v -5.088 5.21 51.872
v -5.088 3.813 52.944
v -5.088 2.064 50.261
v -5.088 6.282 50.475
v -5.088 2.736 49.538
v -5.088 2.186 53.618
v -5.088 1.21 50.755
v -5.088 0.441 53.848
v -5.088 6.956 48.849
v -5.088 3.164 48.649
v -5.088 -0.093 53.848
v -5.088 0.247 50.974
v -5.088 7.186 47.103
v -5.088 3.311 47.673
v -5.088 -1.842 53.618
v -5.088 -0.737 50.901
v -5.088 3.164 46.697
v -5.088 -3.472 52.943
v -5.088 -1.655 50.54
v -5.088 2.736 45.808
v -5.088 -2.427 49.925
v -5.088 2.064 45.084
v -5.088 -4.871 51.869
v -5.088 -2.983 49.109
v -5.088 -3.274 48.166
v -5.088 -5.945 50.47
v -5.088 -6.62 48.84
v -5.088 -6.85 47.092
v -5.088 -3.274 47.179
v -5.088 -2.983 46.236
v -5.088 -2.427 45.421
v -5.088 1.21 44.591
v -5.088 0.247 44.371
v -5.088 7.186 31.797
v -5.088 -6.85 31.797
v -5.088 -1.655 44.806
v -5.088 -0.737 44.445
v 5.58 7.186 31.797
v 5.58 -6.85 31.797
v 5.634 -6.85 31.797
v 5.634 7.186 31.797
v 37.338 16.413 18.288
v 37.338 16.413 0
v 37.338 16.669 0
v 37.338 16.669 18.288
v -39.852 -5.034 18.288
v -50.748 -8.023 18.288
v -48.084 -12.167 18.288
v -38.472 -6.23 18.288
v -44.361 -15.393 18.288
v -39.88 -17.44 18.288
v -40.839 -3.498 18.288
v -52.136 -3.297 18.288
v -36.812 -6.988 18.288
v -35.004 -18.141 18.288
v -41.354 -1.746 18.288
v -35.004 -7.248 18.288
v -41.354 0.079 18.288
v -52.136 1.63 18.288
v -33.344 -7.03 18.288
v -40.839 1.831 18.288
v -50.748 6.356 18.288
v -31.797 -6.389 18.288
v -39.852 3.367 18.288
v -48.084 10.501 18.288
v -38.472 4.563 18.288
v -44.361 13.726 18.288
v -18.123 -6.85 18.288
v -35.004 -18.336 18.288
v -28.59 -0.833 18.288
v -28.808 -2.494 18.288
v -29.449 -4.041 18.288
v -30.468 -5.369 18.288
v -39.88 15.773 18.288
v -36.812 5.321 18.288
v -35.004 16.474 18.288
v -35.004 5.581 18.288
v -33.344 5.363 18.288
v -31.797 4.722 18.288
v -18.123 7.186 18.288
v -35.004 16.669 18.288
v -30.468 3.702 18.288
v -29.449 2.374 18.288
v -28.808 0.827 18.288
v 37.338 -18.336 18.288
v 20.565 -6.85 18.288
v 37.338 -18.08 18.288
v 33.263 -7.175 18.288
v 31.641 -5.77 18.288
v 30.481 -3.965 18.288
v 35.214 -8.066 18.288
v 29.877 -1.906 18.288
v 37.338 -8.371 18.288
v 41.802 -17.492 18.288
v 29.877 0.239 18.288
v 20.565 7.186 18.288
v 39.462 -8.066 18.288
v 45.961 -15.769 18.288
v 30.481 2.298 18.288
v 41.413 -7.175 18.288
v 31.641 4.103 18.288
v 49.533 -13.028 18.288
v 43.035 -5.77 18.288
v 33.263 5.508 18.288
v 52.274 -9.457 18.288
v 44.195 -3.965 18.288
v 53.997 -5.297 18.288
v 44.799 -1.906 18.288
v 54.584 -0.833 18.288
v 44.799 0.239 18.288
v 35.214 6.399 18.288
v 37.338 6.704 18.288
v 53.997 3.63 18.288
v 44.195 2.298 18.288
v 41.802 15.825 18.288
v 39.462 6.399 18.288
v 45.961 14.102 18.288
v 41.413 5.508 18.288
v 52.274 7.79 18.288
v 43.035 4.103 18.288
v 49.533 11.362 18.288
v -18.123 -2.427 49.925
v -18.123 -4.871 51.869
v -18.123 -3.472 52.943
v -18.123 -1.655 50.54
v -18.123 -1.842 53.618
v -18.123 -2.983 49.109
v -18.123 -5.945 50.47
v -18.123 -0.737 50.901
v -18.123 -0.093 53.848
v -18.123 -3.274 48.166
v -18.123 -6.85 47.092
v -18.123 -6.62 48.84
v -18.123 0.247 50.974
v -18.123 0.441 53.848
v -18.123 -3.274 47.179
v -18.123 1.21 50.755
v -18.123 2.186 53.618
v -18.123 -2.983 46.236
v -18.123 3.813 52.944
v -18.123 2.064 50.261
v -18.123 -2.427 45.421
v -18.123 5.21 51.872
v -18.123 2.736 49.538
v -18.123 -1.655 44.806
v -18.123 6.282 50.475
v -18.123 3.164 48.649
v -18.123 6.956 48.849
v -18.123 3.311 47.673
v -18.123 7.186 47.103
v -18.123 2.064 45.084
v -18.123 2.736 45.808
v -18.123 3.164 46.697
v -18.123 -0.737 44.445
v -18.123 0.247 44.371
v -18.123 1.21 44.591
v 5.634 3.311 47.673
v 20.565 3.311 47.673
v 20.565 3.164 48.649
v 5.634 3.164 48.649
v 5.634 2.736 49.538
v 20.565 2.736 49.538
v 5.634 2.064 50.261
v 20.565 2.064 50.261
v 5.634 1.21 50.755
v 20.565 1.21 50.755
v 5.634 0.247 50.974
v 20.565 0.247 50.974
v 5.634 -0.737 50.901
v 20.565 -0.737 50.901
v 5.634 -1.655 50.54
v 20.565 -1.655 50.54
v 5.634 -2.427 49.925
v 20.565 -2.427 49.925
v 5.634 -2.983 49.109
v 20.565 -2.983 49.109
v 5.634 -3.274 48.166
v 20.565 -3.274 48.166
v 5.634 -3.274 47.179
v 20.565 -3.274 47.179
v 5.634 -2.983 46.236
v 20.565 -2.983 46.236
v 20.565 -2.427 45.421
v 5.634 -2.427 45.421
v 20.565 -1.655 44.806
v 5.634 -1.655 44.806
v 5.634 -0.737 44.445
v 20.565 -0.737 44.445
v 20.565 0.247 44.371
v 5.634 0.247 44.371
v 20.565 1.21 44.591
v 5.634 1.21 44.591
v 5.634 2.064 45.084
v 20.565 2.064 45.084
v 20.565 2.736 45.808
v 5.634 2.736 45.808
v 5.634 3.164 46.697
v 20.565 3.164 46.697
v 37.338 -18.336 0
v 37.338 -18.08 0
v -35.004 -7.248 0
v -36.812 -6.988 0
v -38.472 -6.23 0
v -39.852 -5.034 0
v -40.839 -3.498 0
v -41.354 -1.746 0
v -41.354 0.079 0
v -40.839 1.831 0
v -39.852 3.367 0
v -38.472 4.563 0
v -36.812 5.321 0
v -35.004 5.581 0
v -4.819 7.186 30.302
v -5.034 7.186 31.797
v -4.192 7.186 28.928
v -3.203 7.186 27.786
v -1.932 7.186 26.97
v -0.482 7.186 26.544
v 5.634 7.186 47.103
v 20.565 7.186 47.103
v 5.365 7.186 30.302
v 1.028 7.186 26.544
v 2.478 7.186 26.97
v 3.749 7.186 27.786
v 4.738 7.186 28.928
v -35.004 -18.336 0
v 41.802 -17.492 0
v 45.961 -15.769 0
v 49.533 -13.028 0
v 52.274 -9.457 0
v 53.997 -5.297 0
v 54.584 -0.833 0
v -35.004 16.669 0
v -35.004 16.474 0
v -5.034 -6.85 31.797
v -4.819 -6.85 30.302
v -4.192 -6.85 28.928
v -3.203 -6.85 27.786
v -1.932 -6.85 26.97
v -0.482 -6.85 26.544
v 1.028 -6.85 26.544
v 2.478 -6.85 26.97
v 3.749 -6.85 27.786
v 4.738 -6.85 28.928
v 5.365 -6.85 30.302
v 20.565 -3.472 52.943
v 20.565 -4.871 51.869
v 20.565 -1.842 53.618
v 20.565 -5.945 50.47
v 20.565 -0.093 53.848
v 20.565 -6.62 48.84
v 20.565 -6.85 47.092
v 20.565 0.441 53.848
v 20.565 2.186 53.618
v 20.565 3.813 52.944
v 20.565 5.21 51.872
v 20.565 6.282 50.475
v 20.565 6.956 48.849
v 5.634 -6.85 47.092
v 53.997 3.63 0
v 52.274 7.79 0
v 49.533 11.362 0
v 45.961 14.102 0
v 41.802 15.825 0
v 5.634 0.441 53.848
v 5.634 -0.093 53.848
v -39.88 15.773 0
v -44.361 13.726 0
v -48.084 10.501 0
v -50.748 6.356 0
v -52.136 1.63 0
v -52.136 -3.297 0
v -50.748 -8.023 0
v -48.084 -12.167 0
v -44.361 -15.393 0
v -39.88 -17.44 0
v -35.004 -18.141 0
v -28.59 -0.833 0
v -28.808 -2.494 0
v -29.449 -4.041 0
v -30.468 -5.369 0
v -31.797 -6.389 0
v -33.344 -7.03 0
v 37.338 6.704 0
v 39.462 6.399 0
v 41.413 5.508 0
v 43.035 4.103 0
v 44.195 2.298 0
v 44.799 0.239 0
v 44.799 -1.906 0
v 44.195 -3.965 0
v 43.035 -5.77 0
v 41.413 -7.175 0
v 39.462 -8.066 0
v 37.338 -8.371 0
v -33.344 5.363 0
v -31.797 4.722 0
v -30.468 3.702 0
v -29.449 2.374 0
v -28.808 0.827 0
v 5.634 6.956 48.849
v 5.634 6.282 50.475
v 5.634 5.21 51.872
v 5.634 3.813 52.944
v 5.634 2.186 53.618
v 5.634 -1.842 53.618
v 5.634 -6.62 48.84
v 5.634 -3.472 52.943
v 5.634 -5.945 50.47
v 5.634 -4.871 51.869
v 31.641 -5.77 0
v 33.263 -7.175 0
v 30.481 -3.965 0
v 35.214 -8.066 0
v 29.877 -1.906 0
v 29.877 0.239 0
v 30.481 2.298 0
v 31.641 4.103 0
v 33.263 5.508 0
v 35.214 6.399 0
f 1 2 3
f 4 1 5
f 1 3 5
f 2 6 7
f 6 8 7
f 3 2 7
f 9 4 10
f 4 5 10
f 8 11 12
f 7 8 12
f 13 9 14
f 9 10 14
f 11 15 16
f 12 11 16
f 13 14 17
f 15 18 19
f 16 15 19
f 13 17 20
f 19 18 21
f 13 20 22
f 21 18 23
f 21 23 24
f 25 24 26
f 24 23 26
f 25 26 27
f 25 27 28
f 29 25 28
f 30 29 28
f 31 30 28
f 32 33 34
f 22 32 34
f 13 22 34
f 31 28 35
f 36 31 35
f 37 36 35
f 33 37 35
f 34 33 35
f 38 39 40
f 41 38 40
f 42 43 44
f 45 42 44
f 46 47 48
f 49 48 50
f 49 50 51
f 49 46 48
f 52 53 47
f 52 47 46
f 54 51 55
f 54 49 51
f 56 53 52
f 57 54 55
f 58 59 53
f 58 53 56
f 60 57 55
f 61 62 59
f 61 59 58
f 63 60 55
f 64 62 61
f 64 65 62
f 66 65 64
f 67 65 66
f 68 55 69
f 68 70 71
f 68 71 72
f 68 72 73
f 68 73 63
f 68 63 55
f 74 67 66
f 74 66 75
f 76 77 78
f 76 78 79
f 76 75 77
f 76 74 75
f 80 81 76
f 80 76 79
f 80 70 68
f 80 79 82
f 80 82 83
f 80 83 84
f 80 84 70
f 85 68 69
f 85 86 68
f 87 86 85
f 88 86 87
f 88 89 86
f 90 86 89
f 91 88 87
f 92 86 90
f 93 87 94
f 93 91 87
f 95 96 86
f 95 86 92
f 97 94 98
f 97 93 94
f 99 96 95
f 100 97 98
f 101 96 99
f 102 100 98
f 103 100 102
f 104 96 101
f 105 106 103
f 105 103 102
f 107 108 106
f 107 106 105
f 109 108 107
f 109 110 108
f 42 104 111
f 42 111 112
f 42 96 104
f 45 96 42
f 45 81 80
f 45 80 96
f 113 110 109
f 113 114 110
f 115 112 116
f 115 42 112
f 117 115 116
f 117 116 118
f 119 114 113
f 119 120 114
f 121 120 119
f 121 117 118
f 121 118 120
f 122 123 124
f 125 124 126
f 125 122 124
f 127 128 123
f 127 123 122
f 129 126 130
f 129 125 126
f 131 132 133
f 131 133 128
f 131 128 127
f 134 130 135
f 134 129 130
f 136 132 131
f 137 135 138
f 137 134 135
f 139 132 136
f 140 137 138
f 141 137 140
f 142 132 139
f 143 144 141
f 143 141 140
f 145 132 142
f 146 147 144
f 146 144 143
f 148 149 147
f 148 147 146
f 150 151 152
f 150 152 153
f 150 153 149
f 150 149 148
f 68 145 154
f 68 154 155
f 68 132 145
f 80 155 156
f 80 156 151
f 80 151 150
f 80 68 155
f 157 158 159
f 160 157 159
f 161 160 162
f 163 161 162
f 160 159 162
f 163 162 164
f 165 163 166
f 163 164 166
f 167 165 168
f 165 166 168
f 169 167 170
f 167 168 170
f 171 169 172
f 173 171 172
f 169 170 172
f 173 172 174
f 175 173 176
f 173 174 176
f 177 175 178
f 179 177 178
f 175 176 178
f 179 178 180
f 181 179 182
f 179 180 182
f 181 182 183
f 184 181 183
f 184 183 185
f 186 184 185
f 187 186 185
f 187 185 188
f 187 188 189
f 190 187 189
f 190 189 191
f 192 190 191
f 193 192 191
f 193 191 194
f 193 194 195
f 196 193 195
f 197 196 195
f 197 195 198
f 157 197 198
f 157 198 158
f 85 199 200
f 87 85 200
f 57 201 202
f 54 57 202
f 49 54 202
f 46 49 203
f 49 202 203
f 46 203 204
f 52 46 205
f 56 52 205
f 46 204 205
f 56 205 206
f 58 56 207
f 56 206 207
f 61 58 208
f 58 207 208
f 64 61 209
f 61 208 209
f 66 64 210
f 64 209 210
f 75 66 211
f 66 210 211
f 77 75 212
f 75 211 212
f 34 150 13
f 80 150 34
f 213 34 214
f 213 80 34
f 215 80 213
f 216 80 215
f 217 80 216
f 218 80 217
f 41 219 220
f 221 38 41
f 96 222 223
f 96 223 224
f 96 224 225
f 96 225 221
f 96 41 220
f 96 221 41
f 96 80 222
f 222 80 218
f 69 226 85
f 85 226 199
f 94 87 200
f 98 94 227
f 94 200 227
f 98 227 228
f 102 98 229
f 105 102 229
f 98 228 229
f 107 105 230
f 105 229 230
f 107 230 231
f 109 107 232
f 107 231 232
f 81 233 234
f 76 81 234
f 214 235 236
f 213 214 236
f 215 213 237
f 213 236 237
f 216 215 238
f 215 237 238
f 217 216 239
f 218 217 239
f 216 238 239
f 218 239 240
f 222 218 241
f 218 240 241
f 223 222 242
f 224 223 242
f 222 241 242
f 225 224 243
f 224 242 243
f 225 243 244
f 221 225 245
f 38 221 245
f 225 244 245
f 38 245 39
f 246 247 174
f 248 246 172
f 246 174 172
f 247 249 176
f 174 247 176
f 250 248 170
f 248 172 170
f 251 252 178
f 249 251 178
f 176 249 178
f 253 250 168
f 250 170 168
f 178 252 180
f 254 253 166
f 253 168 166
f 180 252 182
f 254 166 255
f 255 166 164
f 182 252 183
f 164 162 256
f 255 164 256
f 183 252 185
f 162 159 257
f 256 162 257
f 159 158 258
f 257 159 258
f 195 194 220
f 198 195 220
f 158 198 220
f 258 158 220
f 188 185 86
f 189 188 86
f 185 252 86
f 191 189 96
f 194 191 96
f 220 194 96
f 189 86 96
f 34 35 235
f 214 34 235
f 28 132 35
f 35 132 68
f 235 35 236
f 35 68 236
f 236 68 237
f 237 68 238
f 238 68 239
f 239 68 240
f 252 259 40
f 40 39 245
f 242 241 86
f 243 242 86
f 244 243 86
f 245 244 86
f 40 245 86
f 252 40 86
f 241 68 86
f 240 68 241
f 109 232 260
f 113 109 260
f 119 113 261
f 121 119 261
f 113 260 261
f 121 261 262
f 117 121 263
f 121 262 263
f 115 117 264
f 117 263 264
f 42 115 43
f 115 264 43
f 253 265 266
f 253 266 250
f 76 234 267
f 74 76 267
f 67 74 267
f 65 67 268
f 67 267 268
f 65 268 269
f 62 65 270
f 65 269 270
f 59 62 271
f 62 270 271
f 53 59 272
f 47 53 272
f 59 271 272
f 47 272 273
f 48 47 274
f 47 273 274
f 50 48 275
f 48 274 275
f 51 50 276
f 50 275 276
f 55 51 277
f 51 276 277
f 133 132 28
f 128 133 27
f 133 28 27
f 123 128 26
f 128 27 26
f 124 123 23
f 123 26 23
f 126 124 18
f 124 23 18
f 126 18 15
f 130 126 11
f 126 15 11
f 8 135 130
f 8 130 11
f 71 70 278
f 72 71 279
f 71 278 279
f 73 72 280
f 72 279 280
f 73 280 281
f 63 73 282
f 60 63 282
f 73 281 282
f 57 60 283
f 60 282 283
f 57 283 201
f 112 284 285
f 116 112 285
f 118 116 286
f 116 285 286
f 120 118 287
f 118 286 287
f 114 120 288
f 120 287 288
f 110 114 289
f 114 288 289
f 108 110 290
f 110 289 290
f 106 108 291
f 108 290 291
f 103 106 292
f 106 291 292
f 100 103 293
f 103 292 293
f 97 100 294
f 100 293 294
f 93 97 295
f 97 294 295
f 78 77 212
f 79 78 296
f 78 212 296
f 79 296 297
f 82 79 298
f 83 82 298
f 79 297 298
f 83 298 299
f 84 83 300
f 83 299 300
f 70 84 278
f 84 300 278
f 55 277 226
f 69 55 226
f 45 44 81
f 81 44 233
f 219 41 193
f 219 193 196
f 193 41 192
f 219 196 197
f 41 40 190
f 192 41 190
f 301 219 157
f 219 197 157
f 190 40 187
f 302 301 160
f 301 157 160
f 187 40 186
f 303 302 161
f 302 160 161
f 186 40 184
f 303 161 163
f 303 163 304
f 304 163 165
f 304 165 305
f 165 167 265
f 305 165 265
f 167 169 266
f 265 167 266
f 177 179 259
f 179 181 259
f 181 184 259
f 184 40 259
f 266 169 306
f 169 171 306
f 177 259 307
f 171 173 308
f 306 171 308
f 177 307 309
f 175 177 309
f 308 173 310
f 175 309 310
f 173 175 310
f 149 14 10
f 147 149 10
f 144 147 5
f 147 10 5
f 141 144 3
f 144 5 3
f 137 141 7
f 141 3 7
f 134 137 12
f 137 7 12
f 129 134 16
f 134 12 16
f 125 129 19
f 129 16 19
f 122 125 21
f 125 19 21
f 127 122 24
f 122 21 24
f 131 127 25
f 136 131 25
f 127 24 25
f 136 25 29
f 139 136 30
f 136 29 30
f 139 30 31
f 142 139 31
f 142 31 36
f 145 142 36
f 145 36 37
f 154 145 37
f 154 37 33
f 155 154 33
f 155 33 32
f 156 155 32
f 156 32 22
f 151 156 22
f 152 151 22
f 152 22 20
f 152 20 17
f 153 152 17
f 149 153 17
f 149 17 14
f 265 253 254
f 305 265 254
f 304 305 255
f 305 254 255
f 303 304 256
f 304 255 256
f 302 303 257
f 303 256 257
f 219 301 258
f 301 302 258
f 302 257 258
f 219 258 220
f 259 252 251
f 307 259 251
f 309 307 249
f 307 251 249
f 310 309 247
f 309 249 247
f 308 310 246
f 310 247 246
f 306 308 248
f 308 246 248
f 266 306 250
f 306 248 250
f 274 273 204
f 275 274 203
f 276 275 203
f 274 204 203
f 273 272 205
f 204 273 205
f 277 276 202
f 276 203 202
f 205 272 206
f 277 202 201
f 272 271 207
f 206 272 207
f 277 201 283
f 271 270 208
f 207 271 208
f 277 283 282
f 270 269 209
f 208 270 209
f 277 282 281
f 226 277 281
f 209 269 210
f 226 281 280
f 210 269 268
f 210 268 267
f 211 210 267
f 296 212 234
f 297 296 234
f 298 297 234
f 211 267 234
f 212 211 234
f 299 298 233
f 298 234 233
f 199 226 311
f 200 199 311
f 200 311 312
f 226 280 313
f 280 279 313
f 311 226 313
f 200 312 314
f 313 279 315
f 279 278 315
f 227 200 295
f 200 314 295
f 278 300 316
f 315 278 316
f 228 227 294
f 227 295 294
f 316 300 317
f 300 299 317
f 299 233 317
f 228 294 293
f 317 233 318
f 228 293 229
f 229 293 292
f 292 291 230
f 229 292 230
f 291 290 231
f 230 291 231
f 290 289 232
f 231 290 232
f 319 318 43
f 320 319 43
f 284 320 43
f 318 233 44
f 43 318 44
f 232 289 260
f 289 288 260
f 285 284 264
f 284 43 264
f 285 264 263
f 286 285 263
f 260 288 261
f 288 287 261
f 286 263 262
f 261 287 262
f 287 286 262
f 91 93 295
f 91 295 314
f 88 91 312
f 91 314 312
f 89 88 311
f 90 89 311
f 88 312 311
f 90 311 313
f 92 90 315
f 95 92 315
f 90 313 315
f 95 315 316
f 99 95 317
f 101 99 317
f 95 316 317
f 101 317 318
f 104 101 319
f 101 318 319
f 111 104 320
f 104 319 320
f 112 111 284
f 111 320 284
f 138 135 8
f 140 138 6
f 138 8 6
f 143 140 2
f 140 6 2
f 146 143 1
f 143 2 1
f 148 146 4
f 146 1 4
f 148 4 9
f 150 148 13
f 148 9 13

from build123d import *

# Parameters (mm, degrees)
F1_DEPTH  = 18.288
F3_W      = 38.6883560568
F3_H      = 14.0357739292
F4_DEPTH  = 35.56
F5_R      = 6.7564
F6_R      = 6.7453126933
F9_DEPTH  = 51.562
F11_R     = 3.3108000024
F12_DEPTH = 139.954


with BuildPart() as f1:
    # F0 (on Top) → F1 (new body)
    with BuildSketch(Plane.XY):
        with BuildLine():
            Line((37.3380035162, 16.6687499732), (-35.0043773651, 16.6687499732))
            Line((-35.0043773651, 16.6687499732), (-35.0043773651, 16.4739897927))
            ThreePointArc((-35.0043773651, 16.4739897927), (-22.7661779649, 11.4047616221), (-17.6969497944, -0.8334377781))
            ThreePointArc((-17.6969497944, -0.8334377781), (-22.7661779649, -13.0716371782), (-35.0043773651, -18.1408653488))
            Line((-35.0043773651, -18.1408653488), (-35.0043773651, -18.3356255293))
            Line((-35.0043773651, -18.3356255293), (37.3380035162, -18.3356255293))
            Line((37.3380035162, -18.3356255293), (37.3380035162, -18.0797577525))
            ThreePointArc((37.3380035162, -18.0797577525), (20.0916835417, -0.8334377781), (37.3380035162, 16.4128821964))
            Line((37.3380035162, 16.4128821964), (37.3380035162, 16.6687499732))
        make_face()
        with BuildLine():
            ThreePointArc((54.5843234907, -0.8334377781), (49.5329933207, 11.3615520264), (37.3380035162, 16.4128821964))
            Line((37.3380035162, 16.4128821964), (37.3380035162, 6.7044516866))
            ThreePointArc((37.3380035162, 6.7044516866), (42.6680962725, 4.4966549783), (44.8758929809, -0.8334377781))
            ThreePointArc((44.8758929809, -0.8334377781), (42.6680962725, -6.1635305344), (37.3380035162, -8.3713272428))
            Line((37.3380035162, -8.3713272428), (37.3380035162, -18.0797577525))
            ThreePointArc((37.3380035162, -18.0797577525), (49.5329933207, -13.0284275825), (54.5843234907, -0.8334377781))
        make_face()
        with BuildLine():
            Line((-35.0043773651, 5.5813243756), (-35.0043773651, 16.4739897927))
            ThreePointArc((-35.0043773651, 16.4739897927), (-52.3118049358, -0.8334377781), (-35.0043773651, -18.1408653488))
            Line((-35.0043773651, -18.1408653488), (-35.0043773651, -7.2481999317))
            ThreePointArc((-35.0043773651, -7.2481999317), (-41.4191395188, -0.8334377781), (-35.0043773651, 5.5813243756))
        make_face()
        with BuildLine():
            ThreePointArc((-17.6969497944, -0.8334377781), (-22.7661779649, 11.4047616221), (-35.0043773651, 16.4739897927))
            Line((-35.0043773651, 16.4739897927), (-35.0043773651, 5.5813243756))
            ThreePointArc((-35.0043773651, 5.5813243756), (-30.4684555466, 3.7024840405), (-28.5896152114, -0.8334377781))
            ThreePointArc((-28.5896152114, -0.8334377781), (-30.4684555466, -5.3693595966), (-35.0043773651, -7.2481999317))
            Line((-35.0043773651, -7.2481999317), (-35.0043773651, -18.1408653488))
            ThreePointArc((-35.0043773651, -18.1408653488), (-22.7661779649, -13.0716371782), (-17.6969497944, -0.8334377781))
        make_face()
        with BuildLine():
            Line((37.3380035162, 6.7044516866), (37.3380035162, 16.4128821964))
            ThreePointArc((37.3380035162, 16.4128821964), (20.0916835417, -0.8334377781), (37.3380035162, -18.0797577525))
            Line((37.3380035162, -18.0797577525), (37.3380035162, -8.3713272428))
            ThreePointArc((37.3380035162, -8.3713272428), (29.8001140515, -0.8334377781), (37.3380035162, 6.7044516866))
        make_face()
    extrude(amount=F1_DEPTH)

    # F3 (on offset) → F4 (join)
    with BuildSketch(Plane.XY.offset(18.288)):
        with Locations((1.2210039422, 0.1680313144)):
            Rectangle(F3_W, F3_H)
    extrude(amount=F4_DEPTH)

    # F5
    f5_edges = [f1.edges().sort_by_distance(p)[0] for p in [
        (1.221004, -6.849856, 53.848),
    ]]
    fillet(f5_edges, radius=F5_R)

    # F6
    f6_edges = [f1.edges().sort_by_distance(p)[0] for p in [
        (1.221004, 7.185918, 53.848),
    ]]
    fillet(f6_edges, radius=F6_R)

    # F8 (on offset) → F9 (cut)
    with BuildSketch(Plane.XZ.offset(14.732)):
        with BuildLine():
            Line((5.6341080926, 53.8724064827), (-5.0880652852, 53.8724064827))
            Line((-5.0880652852, 53.8724064827), (-5.0880652852, 31.7973420024))
            Line((-5.0880652852, 31.7973420024), (-5.034370235, 31.7973420024))
            ThreePointArc((-5.034370235, 31.7973420024), (0.2730214037, 37.1047336411), (5.5804130424, 31.7973420024))
            Line((5.5804130424, 31.7973420024), (5.6341080926, 31.7973420024))
            Line((5.6341080926, 31.7973420024), (5.6341080926, 53.8724064827))
        make_face()
        with BuildLine():
            ThreePointArc((5.5804130424, 31.7973420024), (0.2730214037, 37.1047336411), (-5.034370235, 31.7973420024))
            Line((-5.034370235, 31.7973420024), (5.5804130424, 31.7973420024))
        make_face()
        with BuildLine():
            Line((5.5804130424, 31.7973420024), (-5.034370235, 31.7973420024))
            ThreePointArc((-5.034370235, 31.7973420024), (0.2730214037, 26.4899503636), (5.5804130424, 31.7973420024))
        make_face()
    extrude(amount=-F9_DEPTH, mode=Mode.SUBTRACT)

    # F11 (on offset) → F12 (cut)
    with BuildSketch(Plane.YZ.offset(25.4)):
        with Locations((0, 47.6729050279)):
            Circle(F11_R)
    extrude(amount=-F12_DEPTH, mode=Mode.SUBTRACT)


solid = f1.part
